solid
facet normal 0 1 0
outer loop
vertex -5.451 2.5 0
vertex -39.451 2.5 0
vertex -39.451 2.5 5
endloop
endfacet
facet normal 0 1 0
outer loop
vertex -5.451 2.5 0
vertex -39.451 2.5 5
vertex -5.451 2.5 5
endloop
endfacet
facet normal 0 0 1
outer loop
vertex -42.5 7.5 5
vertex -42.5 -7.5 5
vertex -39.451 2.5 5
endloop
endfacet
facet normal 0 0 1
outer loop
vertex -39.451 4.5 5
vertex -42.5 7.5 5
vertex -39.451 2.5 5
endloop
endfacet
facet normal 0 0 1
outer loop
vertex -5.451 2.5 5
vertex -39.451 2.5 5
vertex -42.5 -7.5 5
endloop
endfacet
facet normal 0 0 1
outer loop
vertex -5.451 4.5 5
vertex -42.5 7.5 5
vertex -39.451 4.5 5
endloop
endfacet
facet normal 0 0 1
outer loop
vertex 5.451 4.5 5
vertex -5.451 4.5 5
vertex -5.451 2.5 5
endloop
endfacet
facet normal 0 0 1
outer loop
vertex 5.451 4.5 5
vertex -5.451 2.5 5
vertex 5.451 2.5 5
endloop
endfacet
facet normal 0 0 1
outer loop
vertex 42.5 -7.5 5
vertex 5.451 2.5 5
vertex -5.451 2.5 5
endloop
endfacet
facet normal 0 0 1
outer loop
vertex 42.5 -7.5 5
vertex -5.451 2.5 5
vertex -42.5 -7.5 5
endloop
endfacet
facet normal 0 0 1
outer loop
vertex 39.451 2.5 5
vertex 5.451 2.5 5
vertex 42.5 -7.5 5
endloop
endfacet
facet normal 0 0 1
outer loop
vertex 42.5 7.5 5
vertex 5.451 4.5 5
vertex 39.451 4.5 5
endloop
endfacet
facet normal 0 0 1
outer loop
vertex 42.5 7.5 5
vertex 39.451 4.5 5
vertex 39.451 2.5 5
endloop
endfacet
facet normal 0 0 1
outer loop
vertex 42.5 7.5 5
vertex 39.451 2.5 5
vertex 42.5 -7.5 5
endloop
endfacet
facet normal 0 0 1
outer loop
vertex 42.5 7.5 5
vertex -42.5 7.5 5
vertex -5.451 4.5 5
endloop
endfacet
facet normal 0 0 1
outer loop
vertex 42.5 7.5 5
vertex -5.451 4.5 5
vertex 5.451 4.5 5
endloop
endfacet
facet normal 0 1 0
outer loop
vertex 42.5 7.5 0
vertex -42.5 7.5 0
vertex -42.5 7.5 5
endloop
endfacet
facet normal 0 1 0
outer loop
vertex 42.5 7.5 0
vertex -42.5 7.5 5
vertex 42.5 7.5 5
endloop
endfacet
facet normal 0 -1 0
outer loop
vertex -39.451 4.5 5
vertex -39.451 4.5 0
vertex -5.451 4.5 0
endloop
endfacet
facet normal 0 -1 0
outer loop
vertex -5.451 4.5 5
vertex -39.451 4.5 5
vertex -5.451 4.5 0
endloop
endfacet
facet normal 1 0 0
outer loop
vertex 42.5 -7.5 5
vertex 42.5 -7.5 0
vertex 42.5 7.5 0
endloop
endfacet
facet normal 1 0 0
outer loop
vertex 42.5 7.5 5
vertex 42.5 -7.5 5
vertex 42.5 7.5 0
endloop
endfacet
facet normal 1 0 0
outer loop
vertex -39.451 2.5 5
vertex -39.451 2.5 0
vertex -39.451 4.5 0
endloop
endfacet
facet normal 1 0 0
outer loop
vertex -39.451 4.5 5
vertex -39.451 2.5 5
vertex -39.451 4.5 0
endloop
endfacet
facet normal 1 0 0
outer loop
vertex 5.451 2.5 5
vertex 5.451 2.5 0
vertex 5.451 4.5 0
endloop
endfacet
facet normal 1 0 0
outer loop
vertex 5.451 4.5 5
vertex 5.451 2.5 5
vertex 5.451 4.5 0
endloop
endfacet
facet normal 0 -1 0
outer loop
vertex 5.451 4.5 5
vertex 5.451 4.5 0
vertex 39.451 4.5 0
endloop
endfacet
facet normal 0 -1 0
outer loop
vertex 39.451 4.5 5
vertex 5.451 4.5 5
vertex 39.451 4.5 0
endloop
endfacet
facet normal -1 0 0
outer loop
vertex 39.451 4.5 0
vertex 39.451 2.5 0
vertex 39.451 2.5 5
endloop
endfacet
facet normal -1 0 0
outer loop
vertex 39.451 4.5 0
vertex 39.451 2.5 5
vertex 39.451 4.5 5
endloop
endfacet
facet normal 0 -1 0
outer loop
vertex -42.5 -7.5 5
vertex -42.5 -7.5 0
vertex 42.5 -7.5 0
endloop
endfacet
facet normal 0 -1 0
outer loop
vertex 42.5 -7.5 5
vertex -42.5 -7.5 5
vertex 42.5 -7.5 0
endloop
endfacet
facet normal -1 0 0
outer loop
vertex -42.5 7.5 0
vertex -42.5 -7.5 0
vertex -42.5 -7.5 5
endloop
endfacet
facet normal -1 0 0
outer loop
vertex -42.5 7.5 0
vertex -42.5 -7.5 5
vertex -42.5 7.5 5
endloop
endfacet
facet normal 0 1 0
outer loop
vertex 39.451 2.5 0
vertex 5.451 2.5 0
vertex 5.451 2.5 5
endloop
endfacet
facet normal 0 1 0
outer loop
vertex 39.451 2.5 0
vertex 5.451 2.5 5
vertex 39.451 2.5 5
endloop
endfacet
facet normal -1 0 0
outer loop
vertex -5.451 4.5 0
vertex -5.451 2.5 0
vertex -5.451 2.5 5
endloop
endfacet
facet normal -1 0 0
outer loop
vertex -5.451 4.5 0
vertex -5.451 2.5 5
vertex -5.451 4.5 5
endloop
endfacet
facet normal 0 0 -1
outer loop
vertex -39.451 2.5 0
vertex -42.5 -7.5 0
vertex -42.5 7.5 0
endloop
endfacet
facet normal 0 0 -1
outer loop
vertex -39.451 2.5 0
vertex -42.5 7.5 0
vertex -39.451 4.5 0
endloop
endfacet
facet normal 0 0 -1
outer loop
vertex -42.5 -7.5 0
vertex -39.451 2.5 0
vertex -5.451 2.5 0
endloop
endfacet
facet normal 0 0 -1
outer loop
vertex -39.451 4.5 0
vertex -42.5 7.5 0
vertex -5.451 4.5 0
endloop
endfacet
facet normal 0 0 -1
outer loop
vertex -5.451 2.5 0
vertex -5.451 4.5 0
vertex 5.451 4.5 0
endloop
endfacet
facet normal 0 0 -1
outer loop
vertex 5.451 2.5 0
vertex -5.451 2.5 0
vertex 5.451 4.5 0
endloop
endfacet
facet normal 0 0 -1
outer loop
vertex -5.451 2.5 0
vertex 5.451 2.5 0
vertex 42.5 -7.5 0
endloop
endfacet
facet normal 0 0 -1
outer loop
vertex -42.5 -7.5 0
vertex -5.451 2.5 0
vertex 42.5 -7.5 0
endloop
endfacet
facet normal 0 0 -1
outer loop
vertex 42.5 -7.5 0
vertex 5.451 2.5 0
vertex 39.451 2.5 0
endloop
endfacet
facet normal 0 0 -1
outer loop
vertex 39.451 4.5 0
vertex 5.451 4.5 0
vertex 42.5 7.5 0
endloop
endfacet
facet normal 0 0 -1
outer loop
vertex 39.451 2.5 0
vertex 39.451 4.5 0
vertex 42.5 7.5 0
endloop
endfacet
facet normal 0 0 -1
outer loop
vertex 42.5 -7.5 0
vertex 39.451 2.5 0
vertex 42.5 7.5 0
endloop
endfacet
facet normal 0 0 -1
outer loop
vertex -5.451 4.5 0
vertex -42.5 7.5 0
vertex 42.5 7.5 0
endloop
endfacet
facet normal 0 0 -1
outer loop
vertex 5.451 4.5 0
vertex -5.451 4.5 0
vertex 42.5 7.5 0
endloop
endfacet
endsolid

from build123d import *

# Parameters (mm, degrees)
F0_W     = 85
F0_H     = 15
F1_DEPTH = 5
F2_W     = 34
F2_H     = 2
F3_DEPTH = 5.001


with BuildPart() as f1:
    # F0 (on Top) → F1 (new body)
    with BuildSketch(Plane.XY):
        Rectangle(F0_W, F0_H)
    extrude(amount=F1_DEPTH)

    # F2 (on Top) → F3 (cut, through all)
    with BuildSketch(Plane.XY):
        with Locations((-22.451008, 3.5)):
            Rectangle(F2_W, F2_H)
        with Locations((22.451008, 3.5)):
            Rectangle(F2_W, F2_H)
    extrude(amount=F3_DEPTH, mode=Mode.SUBTRACT)


solid = f1.part
